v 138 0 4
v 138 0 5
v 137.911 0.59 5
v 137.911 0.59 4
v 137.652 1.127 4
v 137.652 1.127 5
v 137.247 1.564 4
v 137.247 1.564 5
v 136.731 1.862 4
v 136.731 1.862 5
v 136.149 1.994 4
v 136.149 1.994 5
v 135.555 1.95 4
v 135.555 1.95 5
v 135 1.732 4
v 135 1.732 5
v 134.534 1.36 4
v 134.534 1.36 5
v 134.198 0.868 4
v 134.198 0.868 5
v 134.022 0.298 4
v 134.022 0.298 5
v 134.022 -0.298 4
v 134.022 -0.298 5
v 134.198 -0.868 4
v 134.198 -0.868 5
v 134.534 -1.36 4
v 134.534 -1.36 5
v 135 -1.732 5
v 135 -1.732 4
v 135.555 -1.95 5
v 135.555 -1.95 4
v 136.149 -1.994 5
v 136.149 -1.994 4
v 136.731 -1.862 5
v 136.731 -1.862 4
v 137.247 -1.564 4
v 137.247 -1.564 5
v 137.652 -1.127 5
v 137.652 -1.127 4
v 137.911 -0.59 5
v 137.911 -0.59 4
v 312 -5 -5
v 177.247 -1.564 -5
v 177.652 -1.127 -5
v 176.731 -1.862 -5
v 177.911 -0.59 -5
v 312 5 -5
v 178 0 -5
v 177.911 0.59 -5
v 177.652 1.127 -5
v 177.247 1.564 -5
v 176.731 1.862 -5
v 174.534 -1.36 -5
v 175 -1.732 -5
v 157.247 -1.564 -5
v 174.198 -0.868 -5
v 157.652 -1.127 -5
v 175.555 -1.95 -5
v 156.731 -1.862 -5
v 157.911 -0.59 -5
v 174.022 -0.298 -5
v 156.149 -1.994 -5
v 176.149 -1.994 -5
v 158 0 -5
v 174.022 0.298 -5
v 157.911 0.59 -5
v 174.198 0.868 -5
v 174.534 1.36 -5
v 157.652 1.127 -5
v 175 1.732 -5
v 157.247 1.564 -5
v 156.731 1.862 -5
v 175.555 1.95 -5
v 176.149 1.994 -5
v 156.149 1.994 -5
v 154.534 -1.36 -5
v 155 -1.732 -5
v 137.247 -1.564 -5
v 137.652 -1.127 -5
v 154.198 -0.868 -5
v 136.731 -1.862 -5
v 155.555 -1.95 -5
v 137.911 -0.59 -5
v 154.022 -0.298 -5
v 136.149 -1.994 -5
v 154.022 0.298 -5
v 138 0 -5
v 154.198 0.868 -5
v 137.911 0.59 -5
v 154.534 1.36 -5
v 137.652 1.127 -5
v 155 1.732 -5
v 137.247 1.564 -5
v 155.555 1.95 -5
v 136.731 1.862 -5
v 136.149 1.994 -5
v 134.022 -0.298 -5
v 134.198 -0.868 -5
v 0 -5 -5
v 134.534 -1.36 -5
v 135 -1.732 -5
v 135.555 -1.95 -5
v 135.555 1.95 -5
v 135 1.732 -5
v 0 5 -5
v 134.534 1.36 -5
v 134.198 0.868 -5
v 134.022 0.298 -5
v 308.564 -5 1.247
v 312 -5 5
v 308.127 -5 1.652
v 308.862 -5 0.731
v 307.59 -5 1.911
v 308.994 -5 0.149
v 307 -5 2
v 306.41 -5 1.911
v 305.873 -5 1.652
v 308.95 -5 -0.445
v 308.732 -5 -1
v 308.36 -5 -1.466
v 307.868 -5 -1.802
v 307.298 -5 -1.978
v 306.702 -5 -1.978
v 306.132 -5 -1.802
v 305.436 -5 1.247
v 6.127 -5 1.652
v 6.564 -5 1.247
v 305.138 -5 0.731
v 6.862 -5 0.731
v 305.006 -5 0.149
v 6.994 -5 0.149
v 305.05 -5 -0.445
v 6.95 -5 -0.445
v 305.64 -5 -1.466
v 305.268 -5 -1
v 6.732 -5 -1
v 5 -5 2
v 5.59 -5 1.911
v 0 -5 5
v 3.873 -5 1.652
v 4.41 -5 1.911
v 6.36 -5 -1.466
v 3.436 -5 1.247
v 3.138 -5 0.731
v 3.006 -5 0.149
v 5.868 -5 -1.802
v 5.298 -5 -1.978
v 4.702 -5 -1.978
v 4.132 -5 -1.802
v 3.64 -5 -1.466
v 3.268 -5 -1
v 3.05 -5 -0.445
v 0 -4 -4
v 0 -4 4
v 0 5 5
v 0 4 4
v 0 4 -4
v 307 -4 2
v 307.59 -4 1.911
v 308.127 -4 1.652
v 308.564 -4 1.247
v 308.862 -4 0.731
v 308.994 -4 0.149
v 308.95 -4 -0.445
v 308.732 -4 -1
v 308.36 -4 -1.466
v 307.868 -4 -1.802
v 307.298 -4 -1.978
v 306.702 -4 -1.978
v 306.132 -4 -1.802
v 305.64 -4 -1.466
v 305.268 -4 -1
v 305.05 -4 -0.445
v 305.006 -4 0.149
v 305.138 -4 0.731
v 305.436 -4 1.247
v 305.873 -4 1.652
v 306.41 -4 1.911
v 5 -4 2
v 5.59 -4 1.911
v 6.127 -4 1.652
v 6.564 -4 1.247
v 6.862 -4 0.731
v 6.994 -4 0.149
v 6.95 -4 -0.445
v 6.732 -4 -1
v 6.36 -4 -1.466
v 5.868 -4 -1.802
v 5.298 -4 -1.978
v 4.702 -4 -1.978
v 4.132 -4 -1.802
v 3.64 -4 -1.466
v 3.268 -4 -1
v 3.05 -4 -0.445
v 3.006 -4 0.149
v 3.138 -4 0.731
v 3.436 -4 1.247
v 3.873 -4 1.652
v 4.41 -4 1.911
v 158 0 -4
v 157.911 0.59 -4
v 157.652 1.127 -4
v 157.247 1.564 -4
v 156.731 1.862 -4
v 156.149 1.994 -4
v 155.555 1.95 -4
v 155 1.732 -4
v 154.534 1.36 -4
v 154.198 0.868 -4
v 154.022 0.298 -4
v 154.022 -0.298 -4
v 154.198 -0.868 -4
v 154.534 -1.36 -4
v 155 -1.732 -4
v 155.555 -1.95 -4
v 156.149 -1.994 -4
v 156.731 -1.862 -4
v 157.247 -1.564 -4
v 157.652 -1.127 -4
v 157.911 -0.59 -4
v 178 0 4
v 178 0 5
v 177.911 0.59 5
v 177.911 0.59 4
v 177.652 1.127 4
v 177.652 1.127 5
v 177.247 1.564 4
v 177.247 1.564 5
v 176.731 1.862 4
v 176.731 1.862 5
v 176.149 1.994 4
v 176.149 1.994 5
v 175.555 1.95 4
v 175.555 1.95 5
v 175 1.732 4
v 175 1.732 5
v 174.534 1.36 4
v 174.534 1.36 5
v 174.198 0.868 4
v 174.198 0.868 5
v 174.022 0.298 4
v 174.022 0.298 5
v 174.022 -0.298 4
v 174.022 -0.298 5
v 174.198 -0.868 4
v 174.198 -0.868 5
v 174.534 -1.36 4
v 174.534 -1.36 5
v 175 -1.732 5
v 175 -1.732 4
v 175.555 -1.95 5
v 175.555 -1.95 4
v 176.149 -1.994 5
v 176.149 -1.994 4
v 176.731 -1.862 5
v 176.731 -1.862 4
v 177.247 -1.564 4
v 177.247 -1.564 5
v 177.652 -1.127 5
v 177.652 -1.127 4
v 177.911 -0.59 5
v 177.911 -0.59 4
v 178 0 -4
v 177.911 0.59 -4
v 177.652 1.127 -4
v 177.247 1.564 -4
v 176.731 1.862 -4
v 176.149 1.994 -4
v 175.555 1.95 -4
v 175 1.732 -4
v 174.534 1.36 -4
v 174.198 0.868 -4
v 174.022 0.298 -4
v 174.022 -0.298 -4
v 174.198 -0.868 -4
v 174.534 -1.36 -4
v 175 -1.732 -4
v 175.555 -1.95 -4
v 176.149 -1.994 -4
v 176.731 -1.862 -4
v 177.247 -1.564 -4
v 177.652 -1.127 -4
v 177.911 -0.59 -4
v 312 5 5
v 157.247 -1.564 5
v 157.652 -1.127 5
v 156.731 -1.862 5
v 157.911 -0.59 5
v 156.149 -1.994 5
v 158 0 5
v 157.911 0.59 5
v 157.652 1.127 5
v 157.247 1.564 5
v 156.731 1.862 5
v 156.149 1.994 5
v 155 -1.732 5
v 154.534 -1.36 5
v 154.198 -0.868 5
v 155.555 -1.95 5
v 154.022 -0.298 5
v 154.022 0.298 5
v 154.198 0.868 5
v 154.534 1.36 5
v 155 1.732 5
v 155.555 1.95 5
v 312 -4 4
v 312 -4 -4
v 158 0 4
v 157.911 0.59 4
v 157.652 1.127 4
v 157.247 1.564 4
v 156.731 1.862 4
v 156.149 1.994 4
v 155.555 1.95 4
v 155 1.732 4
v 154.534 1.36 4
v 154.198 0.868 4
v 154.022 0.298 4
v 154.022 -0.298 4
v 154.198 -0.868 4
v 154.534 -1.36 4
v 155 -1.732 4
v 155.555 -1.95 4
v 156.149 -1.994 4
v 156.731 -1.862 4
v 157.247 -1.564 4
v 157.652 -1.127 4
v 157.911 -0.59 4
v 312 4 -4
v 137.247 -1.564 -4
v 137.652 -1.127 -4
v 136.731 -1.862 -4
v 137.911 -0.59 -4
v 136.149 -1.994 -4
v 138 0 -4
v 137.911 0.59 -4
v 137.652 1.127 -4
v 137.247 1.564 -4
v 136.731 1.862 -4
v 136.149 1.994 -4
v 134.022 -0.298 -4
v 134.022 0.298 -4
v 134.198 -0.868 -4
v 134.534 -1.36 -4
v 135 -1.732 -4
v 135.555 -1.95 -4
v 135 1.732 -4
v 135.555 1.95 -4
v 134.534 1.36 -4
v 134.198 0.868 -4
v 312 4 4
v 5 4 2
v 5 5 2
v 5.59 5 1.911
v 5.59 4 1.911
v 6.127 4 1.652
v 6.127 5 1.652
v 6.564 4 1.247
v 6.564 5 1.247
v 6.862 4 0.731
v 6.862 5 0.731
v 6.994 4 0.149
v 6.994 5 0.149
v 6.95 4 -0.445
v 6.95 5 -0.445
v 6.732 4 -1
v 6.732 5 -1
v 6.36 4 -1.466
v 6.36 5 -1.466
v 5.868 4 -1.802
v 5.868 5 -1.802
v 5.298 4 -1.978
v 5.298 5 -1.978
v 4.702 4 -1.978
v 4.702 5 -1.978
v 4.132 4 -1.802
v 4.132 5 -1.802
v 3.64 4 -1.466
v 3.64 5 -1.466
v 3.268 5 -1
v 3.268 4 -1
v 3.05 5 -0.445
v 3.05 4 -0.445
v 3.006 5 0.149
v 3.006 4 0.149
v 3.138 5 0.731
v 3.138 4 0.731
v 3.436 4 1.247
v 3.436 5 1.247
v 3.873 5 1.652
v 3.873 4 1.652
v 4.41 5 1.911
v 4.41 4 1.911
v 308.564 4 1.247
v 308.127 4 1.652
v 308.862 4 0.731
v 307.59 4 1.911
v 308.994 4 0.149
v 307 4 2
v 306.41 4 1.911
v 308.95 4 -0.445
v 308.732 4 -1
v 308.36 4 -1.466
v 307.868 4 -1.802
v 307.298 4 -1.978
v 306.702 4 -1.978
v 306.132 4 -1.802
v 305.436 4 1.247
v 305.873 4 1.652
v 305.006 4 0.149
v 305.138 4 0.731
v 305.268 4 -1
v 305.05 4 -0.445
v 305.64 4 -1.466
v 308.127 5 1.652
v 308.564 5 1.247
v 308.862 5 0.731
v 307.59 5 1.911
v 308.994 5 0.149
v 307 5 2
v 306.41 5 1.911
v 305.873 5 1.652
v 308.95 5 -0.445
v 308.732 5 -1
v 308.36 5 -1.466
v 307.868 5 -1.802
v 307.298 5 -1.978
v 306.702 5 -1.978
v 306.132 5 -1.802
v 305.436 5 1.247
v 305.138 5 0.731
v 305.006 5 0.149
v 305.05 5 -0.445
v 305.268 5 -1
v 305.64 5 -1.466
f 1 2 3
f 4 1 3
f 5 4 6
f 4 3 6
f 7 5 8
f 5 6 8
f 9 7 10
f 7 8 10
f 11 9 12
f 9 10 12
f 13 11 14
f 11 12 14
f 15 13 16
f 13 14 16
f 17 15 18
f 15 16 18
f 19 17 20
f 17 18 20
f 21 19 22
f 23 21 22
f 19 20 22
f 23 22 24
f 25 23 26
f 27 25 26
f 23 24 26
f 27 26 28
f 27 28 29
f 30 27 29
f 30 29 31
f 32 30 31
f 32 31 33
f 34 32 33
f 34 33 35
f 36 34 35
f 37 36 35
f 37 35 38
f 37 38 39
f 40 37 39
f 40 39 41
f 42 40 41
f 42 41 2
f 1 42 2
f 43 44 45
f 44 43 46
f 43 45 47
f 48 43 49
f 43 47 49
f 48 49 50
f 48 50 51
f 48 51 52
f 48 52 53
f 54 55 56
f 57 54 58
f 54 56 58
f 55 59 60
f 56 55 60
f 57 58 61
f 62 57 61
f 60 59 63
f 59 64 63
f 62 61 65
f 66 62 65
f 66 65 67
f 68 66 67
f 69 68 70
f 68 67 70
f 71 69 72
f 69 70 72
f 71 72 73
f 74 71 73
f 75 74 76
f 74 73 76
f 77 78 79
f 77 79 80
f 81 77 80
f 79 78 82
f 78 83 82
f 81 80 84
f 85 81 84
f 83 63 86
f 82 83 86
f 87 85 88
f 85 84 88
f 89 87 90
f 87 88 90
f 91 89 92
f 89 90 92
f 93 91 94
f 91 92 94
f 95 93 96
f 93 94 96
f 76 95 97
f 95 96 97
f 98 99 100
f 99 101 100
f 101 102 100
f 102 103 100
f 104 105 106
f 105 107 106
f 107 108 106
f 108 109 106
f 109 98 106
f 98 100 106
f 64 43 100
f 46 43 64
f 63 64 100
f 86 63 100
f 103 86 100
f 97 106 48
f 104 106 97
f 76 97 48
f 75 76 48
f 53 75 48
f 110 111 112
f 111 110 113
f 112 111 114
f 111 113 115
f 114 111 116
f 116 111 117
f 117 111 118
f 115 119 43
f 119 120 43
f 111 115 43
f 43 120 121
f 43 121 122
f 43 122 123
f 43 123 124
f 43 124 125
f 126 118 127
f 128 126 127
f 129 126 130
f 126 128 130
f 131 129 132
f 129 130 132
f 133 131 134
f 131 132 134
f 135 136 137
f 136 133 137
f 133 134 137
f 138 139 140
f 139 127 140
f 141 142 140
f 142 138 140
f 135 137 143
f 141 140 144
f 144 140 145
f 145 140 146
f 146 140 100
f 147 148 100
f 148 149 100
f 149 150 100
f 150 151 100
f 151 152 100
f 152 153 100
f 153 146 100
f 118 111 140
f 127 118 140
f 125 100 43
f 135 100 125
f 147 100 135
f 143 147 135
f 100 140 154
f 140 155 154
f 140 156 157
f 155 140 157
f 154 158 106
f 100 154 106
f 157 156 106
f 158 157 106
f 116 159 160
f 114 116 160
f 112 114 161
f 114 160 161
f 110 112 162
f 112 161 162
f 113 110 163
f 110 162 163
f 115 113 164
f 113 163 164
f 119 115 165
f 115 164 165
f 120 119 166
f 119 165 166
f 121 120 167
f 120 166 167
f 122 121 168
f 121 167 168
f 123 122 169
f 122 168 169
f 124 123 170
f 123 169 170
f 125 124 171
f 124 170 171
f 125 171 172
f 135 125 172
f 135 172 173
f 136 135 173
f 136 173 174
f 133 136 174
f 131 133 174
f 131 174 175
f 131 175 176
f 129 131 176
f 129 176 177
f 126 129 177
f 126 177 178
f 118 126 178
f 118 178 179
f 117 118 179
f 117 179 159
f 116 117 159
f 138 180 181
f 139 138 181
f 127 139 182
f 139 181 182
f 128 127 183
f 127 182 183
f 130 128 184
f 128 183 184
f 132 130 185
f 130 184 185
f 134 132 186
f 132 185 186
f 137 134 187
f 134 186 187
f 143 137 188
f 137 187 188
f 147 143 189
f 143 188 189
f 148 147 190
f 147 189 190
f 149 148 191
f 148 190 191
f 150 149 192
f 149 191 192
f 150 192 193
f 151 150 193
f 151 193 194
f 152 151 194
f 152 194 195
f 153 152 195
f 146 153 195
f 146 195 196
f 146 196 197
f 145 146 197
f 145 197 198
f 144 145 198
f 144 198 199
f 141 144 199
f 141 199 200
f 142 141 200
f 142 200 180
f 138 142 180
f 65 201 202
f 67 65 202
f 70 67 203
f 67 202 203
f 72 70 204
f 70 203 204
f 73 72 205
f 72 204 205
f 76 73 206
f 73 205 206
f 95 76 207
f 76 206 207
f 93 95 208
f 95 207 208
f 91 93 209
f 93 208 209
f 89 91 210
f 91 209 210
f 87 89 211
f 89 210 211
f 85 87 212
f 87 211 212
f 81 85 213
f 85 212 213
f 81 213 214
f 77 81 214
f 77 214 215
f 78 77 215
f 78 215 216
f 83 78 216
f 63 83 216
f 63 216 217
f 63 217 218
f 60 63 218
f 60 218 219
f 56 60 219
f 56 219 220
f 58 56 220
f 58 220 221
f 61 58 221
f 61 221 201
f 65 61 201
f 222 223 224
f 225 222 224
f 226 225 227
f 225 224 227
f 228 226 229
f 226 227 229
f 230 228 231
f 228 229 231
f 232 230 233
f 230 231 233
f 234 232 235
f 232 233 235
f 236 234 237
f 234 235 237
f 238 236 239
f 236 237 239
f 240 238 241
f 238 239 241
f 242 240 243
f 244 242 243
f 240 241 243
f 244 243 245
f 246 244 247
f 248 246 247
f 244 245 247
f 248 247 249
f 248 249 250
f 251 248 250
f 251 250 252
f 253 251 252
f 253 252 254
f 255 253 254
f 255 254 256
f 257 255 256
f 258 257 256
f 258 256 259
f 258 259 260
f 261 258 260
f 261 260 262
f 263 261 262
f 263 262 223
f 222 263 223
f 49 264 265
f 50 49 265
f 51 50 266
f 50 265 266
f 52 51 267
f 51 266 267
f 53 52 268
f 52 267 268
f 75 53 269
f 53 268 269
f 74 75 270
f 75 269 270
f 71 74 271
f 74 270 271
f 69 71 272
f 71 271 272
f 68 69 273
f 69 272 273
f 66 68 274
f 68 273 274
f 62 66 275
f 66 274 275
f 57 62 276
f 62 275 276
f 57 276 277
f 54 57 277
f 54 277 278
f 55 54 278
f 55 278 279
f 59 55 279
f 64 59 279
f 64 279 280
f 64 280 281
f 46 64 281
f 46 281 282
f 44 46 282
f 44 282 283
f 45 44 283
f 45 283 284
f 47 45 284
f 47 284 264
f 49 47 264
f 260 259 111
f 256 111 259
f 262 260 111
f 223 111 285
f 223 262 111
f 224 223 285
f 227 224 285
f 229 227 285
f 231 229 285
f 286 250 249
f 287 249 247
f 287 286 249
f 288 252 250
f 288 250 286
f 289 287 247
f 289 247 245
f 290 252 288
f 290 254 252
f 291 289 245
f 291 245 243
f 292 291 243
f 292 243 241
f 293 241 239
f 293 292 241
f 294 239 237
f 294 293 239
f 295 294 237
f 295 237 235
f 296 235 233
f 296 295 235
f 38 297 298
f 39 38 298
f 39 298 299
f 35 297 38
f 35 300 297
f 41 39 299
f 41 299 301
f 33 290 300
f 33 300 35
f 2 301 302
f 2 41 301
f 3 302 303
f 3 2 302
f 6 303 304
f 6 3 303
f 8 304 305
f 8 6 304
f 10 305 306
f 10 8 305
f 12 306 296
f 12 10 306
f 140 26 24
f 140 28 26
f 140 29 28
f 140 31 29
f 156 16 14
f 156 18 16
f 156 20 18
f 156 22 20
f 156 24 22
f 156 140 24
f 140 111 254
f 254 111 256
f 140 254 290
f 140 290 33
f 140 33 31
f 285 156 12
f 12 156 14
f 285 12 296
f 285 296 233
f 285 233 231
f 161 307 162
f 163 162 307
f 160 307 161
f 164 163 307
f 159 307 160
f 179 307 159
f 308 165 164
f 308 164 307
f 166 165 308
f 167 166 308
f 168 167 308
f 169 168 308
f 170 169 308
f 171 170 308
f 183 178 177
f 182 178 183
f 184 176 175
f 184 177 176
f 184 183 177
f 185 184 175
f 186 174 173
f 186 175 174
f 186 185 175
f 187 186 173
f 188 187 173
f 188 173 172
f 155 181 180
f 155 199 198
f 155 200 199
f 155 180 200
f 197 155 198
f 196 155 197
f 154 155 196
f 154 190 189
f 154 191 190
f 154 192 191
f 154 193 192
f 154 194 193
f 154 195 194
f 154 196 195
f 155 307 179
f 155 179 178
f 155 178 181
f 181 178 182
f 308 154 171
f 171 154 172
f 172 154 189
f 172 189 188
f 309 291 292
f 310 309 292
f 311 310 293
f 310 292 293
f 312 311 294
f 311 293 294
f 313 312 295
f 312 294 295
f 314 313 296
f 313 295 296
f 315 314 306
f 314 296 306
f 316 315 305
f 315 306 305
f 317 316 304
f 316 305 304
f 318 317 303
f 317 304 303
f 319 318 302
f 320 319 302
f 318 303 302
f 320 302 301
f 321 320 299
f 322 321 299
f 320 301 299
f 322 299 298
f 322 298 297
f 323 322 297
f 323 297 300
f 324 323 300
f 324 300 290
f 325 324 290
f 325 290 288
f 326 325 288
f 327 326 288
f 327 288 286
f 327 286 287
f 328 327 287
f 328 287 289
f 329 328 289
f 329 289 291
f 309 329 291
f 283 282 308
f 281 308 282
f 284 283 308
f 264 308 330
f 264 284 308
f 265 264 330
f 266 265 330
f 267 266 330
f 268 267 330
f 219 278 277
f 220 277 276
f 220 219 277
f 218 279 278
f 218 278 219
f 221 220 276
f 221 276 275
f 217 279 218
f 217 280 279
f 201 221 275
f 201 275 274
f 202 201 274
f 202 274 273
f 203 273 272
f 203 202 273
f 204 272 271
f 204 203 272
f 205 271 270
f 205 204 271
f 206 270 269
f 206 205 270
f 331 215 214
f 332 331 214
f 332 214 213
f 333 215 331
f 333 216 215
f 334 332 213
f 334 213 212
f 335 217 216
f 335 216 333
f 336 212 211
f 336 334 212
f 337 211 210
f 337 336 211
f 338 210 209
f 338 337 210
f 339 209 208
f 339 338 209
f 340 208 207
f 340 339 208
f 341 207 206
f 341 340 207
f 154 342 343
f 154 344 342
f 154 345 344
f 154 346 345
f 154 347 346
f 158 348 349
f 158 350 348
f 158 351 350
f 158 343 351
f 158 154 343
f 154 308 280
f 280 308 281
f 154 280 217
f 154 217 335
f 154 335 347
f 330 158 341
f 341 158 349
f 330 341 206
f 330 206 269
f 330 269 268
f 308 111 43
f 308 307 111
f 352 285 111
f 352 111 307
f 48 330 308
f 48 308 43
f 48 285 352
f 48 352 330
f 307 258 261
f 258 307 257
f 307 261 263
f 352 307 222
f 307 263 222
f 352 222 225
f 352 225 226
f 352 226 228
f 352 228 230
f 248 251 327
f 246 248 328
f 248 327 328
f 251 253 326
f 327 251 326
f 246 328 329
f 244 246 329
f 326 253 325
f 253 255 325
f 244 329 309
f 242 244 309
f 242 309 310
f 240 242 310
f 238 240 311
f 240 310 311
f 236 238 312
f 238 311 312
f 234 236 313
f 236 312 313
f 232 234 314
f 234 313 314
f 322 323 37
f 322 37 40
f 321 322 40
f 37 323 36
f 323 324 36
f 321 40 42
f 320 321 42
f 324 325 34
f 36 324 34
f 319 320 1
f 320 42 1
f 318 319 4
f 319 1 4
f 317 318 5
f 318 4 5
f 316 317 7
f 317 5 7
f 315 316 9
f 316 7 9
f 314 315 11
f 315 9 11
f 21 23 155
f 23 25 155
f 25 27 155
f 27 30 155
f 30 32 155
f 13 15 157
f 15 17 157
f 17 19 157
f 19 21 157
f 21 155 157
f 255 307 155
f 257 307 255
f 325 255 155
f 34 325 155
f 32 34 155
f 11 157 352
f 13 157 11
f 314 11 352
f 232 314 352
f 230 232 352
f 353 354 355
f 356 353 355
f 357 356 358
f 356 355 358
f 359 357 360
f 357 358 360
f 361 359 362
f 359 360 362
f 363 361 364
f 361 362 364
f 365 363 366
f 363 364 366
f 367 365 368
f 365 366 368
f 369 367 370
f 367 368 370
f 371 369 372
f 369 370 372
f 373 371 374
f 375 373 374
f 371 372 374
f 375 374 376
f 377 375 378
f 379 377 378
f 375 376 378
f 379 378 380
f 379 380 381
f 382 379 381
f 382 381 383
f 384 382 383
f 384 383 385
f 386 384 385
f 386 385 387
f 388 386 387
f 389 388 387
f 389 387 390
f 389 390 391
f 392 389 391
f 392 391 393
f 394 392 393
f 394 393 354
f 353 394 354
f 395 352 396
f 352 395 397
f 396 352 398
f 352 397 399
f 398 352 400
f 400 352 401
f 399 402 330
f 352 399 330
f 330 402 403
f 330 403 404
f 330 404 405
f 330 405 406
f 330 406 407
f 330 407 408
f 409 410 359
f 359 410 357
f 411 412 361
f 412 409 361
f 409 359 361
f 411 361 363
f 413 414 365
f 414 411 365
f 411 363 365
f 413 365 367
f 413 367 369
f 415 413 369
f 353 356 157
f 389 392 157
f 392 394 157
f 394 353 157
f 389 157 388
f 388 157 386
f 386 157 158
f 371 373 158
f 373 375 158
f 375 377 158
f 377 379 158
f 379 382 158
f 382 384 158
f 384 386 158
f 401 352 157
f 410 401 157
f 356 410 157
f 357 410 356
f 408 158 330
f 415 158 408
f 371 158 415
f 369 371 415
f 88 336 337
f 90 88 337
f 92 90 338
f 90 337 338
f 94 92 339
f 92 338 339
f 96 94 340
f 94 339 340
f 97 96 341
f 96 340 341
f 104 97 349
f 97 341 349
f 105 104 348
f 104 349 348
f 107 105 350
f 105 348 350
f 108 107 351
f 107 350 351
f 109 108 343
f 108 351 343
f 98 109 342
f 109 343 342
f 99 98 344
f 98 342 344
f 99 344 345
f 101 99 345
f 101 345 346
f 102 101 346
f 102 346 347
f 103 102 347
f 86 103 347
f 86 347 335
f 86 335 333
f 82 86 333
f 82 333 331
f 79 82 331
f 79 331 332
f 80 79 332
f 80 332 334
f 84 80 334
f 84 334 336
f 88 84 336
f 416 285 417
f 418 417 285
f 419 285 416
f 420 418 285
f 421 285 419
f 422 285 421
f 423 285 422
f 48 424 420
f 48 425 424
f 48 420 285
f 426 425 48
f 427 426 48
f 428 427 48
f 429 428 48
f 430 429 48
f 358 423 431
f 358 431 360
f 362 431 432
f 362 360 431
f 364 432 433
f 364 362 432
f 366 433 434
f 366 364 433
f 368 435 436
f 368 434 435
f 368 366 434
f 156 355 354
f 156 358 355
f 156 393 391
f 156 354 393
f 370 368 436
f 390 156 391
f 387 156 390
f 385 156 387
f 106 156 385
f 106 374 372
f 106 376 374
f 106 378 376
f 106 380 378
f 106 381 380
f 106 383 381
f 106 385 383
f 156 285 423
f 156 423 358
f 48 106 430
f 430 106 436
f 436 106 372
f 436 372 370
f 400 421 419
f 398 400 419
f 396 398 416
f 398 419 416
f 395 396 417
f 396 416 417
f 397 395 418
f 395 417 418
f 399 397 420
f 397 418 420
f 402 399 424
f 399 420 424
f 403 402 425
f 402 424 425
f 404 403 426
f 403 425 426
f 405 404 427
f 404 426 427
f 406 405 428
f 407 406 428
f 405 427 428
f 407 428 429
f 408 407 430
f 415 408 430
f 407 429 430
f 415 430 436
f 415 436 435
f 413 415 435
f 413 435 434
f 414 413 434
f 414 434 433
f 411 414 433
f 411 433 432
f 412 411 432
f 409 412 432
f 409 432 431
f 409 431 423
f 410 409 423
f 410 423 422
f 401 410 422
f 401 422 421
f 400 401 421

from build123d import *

# Parameters (mm, degrees)
SKETCH_1_W          = 10
SKETCH_1_H          = 10
SKETCH_1_W_2        = 8
SKETCH_1_H_2        = 8
EXTRUDE_1_DEPTH     = 312
SKETCH_2_R          = 2
CUT_EXTRUDE_1_DEPTH = 313.200256246
SKETCH_3_R          = 2
CUT_EXTRUDE_2_DEPTH = 313.200256246


with BuildPart() as part:
    # ｽｹｯﾁ1 → 押し出し-薄板1 (new body)
    with BuildSketch(Plane(origin=(0, 0, 0), x_dir=(0, 0, -1), z_dir=(1, 0, 0))):
        Rectangle(SKETCH_1_W, SKETCH_1_H)
        Rectangle(SKETCH_1_W_2, SKETCH_1_H_2, mode=Mode.SUBTRACT)
    extrude(amount=EXTRUDE_1_DEPTH)

    # ｽｹｯﾁ2 → ｶｯﾄ - 押し出し1 (cut, through all)
    with BuildSketch(Plane(origin=(0, 5, 0), x_dir=(1, 0, 0), z_dir=(0, 1, 0))):
        with Locations(Location((5, 0, 0), (0, 0, 270))):
            Circle(SKETCH_2_R)
        with Locations(Location((307, 0, 0), (0, 0, 270))):
            Circle(SKETCH_2_R)
    extrude(amount=-CUT_EXTRUDE_1_DEPTH, mode=Mode.SUBTRACT)

    # ｽｹｯﾁ3 → ｶｯﾄ - 押し出し2 (cut, through all)
    with BuildSketch(Plane.XY.offset(5)):
        with Locations((136, 0)):
            Circle(SKETCH_3_R)
        with Locations((156, 0)):
            Circle(SKETCH_3_R)
        with Locations((176, 0)):
            Circle(SKETCH_3_R)
    extrude(amount=-CUT_EXTRUDE_2_DEPTH, mode=Mode.SUBTRACT)


solid = part.part
